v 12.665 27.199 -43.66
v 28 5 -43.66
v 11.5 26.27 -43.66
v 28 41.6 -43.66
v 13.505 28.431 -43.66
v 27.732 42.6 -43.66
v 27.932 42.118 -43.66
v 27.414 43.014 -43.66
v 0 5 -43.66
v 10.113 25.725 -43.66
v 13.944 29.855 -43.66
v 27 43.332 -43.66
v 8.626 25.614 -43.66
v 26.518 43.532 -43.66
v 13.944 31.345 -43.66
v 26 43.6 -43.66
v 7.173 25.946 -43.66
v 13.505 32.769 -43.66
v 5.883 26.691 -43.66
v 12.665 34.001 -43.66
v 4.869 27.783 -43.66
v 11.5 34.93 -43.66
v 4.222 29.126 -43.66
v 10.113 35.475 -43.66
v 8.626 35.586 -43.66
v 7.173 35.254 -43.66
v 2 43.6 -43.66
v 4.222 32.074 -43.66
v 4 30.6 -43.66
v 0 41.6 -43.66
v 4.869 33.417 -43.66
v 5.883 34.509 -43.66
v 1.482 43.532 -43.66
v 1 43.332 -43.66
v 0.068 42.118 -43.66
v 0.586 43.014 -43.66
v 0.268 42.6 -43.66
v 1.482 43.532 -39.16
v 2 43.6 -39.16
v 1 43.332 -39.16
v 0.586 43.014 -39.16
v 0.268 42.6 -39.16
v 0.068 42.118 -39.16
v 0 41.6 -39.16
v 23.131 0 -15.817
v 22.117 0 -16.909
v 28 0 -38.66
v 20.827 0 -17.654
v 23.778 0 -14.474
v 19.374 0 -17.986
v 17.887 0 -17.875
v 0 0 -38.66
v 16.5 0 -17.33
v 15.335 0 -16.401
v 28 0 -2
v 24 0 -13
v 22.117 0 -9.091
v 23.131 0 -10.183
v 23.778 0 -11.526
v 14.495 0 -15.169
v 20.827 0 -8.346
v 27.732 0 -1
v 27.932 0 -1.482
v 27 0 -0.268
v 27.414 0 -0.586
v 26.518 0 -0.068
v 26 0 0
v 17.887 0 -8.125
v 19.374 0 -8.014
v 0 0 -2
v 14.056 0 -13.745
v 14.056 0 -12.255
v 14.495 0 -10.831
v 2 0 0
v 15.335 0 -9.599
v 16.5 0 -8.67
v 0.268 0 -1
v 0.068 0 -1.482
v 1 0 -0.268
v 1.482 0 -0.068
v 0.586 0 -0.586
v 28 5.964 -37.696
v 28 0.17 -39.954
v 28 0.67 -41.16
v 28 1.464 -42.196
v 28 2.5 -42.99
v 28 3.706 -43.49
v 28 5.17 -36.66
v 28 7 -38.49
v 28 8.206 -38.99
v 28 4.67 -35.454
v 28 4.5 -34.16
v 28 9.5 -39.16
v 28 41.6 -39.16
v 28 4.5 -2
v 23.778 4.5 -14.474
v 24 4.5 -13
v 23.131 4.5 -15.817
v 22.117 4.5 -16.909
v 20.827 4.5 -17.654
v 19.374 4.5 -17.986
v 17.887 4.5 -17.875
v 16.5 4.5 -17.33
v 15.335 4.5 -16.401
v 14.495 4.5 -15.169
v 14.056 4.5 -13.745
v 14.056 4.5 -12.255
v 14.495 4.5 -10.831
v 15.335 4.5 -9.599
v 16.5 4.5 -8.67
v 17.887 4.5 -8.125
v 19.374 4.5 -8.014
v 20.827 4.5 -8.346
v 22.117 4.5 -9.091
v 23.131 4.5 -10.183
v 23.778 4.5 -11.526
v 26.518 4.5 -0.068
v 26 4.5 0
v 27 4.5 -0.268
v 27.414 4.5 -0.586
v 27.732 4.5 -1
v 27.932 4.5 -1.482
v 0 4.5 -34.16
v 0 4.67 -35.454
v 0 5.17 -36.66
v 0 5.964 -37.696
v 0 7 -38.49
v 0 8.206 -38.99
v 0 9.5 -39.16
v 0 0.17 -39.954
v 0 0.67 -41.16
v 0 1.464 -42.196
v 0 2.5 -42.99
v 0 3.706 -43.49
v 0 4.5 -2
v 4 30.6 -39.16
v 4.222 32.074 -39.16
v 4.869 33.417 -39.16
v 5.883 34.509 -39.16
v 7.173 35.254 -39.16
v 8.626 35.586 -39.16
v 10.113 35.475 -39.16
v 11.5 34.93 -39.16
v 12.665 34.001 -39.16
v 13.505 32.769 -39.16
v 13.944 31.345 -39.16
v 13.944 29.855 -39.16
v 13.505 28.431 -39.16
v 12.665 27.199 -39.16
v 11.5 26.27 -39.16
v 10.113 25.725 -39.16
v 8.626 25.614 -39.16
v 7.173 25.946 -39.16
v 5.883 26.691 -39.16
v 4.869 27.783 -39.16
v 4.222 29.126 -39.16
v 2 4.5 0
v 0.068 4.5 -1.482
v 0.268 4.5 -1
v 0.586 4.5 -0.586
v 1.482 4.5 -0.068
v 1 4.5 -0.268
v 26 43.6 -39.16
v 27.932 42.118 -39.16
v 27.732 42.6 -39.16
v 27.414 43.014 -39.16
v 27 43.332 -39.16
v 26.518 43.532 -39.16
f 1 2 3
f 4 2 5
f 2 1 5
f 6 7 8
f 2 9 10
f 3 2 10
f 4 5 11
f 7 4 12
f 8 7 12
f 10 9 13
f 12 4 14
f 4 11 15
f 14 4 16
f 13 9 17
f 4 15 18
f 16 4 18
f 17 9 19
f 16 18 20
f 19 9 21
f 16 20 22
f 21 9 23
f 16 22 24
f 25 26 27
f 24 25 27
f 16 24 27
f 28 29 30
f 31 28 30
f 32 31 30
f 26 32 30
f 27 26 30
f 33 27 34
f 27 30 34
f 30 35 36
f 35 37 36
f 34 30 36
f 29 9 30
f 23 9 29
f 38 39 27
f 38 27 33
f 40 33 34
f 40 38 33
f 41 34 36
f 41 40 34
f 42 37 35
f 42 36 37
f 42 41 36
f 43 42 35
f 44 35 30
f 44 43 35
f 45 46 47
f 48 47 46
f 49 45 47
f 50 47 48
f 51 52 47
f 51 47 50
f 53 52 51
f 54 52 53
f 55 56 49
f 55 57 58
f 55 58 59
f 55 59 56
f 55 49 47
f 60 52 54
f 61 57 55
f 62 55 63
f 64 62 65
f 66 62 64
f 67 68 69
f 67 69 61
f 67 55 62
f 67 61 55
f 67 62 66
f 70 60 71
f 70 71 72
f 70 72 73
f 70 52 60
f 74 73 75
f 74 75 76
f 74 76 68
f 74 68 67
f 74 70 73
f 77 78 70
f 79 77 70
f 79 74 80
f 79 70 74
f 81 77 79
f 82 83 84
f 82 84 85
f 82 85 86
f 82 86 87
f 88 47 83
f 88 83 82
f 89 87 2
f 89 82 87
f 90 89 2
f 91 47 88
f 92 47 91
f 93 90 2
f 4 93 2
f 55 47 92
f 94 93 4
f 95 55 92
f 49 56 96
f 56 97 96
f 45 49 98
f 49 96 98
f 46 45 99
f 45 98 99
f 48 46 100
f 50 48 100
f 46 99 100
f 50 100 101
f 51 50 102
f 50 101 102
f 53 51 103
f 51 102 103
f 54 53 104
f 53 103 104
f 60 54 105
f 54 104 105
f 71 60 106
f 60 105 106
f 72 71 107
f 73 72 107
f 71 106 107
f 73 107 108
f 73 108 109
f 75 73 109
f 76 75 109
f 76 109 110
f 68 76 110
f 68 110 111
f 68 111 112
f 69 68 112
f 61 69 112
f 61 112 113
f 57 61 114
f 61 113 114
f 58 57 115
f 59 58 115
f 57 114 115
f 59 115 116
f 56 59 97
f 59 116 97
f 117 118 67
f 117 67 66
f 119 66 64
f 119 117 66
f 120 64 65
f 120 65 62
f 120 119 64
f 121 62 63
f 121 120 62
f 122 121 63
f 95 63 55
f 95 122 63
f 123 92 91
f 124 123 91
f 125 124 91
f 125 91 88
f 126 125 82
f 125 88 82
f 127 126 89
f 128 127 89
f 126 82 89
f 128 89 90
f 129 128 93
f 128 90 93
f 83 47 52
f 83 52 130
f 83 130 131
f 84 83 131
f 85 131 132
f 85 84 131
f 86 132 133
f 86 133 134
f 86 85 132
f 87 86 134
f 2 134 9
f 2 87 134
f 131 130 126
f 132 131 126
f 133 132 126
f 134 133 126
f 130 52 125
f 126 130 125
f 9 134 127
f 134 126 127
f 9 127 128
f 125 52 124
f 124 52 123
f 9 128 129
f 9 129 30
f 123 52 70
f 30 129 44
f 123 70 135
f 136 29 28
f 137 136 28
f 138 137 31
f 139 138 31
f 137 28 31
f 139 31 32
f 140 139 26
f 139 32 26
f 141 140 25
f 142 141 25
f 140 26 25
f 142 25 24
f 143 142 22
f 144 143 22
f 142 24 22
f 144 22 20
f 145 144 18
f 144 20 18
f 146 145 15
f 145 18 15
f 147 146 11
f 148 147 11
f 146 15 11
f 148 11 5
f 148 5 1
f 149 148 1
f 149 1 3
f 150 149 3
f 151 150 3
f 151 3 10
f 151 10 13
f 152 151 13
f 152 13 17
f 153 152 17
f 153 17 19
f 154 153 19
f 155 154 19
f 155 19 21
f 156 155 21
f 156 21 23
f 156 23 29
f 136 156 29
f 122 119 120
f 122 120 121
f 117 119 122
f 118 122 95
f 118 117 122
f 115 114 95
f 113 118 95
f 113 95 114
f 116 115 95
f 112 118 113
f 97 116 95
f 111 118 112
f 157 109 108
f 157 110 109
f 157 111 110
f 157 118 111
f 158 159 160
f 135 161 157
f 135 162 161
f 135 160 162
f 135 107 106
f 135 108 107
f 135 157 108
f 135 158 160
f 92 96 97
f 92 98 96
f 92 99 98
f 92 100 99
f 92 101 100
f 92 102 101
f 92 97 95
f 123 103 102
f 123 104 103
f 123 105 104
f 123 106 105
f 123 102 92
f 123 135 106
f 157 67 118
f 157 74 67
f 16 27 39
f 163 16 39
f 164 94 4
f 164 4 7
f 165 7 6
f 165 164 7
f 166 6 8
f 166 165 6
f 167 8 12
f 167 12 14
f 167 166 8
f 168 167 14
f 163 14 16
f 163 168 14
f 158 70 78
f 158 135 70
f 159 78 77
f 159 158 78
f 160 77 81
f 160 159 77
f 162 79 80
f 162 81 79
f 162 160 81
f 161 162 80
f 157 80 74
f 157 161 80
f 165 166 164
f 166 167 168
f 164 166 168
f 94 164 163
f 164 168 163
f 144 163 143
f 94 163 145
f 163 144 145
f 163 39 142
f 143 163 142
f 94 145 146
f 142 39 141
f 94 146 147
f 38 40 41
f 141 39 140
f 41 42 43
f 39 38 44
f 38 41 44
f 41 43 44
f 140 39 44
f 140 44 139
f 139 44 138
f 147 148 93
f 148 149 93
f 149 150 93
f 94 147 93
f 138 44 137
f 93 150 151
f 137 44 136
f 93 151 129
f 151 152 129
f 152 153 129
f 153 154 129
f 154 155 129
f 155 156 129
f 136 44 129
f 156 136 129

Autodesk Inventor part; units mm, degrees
ref_plane "YZ Plane" through (0, 0, 0) normal (1, 0, 0) x (0, 1, 0)
ref_plane "XZ Plane" through (0, 0, 0) normal (0, 1, 0) x (-1, 0, 0)
ref_plane "XY Plane" through (0, 0, 0) normal (0, 0, 1) x (1, 0, 0)
sketch "Sketch1" plane through (0, 0, 0) normal (1, 0, 0) x (0, 1, 0)
  line L0 (0, 0) -> (4.5, 0)
  line L1 (4.5, 0) -> (4.5, -39.16)
  line L2 (1.7807, -43.66) -> (0, -43.66)
  line L3 (0, -43.66) -> (0, 0)
  line L4 (0, -43.66) -> (43.6, -43.66)
  line L5 (43.6, -43.66) -> (43.6, -39.16)
  line L6 (43.6, -39.16) -> (4.5, -39.16)
  line L7 (0, -7.4197) -> (0, -43.66)
  dimension "d0" = 43.6
  dimension "d1" = 43.66
  dimension "d2" = 4.5
  dimension "d3" = 4.5
extrude "Extrusion1" add sketch "Sketch1" along normal blind 28
sketch "Sketch2" plane through (0, 4.5, 0) normal (0, 1, 0) x (1, 0, 0)
  circle A0 centre (19, 13) radius 5
  line L0 (28, 39.16) -> (28, 0) projected
  line L1 (0, 0) -> (28, 0) projected
  dimension "d6" = 10
  dimension "d7" = 9
  dimension "d8" = 13
sketch "Sketch3" plane through (0, 0, -43.66) normal (0, 0, -1) x (-1, 0, 0)
  circle A0 centre (-9, 30.6) radius 5
  line L0 (0, 0) -> (0, 43.6) projected
  line L1 (0, 43.6) -> (-28, 43.6) projected
  dimension "d9" = 9
  dimension "d10" = 13
  dimension "d11" = 10
extrude "Extrusion2" cut sketch "Sketch3" against normal up to next
extrude "Extrusion3" cut sketch "Sketch2" against normal up to next
fillet "Fillet1" radius 2 4 edges at (0, 43.6, -41.41) (28, 43.6, -41.41) (0, 2.25, 0) (28, 2.25, 0)
fillet "Fillet2" radius 5 2 edges at (14, 0, -43.66) (14, 4.5, -39.16)
properties part number "shin_L_bracket"
